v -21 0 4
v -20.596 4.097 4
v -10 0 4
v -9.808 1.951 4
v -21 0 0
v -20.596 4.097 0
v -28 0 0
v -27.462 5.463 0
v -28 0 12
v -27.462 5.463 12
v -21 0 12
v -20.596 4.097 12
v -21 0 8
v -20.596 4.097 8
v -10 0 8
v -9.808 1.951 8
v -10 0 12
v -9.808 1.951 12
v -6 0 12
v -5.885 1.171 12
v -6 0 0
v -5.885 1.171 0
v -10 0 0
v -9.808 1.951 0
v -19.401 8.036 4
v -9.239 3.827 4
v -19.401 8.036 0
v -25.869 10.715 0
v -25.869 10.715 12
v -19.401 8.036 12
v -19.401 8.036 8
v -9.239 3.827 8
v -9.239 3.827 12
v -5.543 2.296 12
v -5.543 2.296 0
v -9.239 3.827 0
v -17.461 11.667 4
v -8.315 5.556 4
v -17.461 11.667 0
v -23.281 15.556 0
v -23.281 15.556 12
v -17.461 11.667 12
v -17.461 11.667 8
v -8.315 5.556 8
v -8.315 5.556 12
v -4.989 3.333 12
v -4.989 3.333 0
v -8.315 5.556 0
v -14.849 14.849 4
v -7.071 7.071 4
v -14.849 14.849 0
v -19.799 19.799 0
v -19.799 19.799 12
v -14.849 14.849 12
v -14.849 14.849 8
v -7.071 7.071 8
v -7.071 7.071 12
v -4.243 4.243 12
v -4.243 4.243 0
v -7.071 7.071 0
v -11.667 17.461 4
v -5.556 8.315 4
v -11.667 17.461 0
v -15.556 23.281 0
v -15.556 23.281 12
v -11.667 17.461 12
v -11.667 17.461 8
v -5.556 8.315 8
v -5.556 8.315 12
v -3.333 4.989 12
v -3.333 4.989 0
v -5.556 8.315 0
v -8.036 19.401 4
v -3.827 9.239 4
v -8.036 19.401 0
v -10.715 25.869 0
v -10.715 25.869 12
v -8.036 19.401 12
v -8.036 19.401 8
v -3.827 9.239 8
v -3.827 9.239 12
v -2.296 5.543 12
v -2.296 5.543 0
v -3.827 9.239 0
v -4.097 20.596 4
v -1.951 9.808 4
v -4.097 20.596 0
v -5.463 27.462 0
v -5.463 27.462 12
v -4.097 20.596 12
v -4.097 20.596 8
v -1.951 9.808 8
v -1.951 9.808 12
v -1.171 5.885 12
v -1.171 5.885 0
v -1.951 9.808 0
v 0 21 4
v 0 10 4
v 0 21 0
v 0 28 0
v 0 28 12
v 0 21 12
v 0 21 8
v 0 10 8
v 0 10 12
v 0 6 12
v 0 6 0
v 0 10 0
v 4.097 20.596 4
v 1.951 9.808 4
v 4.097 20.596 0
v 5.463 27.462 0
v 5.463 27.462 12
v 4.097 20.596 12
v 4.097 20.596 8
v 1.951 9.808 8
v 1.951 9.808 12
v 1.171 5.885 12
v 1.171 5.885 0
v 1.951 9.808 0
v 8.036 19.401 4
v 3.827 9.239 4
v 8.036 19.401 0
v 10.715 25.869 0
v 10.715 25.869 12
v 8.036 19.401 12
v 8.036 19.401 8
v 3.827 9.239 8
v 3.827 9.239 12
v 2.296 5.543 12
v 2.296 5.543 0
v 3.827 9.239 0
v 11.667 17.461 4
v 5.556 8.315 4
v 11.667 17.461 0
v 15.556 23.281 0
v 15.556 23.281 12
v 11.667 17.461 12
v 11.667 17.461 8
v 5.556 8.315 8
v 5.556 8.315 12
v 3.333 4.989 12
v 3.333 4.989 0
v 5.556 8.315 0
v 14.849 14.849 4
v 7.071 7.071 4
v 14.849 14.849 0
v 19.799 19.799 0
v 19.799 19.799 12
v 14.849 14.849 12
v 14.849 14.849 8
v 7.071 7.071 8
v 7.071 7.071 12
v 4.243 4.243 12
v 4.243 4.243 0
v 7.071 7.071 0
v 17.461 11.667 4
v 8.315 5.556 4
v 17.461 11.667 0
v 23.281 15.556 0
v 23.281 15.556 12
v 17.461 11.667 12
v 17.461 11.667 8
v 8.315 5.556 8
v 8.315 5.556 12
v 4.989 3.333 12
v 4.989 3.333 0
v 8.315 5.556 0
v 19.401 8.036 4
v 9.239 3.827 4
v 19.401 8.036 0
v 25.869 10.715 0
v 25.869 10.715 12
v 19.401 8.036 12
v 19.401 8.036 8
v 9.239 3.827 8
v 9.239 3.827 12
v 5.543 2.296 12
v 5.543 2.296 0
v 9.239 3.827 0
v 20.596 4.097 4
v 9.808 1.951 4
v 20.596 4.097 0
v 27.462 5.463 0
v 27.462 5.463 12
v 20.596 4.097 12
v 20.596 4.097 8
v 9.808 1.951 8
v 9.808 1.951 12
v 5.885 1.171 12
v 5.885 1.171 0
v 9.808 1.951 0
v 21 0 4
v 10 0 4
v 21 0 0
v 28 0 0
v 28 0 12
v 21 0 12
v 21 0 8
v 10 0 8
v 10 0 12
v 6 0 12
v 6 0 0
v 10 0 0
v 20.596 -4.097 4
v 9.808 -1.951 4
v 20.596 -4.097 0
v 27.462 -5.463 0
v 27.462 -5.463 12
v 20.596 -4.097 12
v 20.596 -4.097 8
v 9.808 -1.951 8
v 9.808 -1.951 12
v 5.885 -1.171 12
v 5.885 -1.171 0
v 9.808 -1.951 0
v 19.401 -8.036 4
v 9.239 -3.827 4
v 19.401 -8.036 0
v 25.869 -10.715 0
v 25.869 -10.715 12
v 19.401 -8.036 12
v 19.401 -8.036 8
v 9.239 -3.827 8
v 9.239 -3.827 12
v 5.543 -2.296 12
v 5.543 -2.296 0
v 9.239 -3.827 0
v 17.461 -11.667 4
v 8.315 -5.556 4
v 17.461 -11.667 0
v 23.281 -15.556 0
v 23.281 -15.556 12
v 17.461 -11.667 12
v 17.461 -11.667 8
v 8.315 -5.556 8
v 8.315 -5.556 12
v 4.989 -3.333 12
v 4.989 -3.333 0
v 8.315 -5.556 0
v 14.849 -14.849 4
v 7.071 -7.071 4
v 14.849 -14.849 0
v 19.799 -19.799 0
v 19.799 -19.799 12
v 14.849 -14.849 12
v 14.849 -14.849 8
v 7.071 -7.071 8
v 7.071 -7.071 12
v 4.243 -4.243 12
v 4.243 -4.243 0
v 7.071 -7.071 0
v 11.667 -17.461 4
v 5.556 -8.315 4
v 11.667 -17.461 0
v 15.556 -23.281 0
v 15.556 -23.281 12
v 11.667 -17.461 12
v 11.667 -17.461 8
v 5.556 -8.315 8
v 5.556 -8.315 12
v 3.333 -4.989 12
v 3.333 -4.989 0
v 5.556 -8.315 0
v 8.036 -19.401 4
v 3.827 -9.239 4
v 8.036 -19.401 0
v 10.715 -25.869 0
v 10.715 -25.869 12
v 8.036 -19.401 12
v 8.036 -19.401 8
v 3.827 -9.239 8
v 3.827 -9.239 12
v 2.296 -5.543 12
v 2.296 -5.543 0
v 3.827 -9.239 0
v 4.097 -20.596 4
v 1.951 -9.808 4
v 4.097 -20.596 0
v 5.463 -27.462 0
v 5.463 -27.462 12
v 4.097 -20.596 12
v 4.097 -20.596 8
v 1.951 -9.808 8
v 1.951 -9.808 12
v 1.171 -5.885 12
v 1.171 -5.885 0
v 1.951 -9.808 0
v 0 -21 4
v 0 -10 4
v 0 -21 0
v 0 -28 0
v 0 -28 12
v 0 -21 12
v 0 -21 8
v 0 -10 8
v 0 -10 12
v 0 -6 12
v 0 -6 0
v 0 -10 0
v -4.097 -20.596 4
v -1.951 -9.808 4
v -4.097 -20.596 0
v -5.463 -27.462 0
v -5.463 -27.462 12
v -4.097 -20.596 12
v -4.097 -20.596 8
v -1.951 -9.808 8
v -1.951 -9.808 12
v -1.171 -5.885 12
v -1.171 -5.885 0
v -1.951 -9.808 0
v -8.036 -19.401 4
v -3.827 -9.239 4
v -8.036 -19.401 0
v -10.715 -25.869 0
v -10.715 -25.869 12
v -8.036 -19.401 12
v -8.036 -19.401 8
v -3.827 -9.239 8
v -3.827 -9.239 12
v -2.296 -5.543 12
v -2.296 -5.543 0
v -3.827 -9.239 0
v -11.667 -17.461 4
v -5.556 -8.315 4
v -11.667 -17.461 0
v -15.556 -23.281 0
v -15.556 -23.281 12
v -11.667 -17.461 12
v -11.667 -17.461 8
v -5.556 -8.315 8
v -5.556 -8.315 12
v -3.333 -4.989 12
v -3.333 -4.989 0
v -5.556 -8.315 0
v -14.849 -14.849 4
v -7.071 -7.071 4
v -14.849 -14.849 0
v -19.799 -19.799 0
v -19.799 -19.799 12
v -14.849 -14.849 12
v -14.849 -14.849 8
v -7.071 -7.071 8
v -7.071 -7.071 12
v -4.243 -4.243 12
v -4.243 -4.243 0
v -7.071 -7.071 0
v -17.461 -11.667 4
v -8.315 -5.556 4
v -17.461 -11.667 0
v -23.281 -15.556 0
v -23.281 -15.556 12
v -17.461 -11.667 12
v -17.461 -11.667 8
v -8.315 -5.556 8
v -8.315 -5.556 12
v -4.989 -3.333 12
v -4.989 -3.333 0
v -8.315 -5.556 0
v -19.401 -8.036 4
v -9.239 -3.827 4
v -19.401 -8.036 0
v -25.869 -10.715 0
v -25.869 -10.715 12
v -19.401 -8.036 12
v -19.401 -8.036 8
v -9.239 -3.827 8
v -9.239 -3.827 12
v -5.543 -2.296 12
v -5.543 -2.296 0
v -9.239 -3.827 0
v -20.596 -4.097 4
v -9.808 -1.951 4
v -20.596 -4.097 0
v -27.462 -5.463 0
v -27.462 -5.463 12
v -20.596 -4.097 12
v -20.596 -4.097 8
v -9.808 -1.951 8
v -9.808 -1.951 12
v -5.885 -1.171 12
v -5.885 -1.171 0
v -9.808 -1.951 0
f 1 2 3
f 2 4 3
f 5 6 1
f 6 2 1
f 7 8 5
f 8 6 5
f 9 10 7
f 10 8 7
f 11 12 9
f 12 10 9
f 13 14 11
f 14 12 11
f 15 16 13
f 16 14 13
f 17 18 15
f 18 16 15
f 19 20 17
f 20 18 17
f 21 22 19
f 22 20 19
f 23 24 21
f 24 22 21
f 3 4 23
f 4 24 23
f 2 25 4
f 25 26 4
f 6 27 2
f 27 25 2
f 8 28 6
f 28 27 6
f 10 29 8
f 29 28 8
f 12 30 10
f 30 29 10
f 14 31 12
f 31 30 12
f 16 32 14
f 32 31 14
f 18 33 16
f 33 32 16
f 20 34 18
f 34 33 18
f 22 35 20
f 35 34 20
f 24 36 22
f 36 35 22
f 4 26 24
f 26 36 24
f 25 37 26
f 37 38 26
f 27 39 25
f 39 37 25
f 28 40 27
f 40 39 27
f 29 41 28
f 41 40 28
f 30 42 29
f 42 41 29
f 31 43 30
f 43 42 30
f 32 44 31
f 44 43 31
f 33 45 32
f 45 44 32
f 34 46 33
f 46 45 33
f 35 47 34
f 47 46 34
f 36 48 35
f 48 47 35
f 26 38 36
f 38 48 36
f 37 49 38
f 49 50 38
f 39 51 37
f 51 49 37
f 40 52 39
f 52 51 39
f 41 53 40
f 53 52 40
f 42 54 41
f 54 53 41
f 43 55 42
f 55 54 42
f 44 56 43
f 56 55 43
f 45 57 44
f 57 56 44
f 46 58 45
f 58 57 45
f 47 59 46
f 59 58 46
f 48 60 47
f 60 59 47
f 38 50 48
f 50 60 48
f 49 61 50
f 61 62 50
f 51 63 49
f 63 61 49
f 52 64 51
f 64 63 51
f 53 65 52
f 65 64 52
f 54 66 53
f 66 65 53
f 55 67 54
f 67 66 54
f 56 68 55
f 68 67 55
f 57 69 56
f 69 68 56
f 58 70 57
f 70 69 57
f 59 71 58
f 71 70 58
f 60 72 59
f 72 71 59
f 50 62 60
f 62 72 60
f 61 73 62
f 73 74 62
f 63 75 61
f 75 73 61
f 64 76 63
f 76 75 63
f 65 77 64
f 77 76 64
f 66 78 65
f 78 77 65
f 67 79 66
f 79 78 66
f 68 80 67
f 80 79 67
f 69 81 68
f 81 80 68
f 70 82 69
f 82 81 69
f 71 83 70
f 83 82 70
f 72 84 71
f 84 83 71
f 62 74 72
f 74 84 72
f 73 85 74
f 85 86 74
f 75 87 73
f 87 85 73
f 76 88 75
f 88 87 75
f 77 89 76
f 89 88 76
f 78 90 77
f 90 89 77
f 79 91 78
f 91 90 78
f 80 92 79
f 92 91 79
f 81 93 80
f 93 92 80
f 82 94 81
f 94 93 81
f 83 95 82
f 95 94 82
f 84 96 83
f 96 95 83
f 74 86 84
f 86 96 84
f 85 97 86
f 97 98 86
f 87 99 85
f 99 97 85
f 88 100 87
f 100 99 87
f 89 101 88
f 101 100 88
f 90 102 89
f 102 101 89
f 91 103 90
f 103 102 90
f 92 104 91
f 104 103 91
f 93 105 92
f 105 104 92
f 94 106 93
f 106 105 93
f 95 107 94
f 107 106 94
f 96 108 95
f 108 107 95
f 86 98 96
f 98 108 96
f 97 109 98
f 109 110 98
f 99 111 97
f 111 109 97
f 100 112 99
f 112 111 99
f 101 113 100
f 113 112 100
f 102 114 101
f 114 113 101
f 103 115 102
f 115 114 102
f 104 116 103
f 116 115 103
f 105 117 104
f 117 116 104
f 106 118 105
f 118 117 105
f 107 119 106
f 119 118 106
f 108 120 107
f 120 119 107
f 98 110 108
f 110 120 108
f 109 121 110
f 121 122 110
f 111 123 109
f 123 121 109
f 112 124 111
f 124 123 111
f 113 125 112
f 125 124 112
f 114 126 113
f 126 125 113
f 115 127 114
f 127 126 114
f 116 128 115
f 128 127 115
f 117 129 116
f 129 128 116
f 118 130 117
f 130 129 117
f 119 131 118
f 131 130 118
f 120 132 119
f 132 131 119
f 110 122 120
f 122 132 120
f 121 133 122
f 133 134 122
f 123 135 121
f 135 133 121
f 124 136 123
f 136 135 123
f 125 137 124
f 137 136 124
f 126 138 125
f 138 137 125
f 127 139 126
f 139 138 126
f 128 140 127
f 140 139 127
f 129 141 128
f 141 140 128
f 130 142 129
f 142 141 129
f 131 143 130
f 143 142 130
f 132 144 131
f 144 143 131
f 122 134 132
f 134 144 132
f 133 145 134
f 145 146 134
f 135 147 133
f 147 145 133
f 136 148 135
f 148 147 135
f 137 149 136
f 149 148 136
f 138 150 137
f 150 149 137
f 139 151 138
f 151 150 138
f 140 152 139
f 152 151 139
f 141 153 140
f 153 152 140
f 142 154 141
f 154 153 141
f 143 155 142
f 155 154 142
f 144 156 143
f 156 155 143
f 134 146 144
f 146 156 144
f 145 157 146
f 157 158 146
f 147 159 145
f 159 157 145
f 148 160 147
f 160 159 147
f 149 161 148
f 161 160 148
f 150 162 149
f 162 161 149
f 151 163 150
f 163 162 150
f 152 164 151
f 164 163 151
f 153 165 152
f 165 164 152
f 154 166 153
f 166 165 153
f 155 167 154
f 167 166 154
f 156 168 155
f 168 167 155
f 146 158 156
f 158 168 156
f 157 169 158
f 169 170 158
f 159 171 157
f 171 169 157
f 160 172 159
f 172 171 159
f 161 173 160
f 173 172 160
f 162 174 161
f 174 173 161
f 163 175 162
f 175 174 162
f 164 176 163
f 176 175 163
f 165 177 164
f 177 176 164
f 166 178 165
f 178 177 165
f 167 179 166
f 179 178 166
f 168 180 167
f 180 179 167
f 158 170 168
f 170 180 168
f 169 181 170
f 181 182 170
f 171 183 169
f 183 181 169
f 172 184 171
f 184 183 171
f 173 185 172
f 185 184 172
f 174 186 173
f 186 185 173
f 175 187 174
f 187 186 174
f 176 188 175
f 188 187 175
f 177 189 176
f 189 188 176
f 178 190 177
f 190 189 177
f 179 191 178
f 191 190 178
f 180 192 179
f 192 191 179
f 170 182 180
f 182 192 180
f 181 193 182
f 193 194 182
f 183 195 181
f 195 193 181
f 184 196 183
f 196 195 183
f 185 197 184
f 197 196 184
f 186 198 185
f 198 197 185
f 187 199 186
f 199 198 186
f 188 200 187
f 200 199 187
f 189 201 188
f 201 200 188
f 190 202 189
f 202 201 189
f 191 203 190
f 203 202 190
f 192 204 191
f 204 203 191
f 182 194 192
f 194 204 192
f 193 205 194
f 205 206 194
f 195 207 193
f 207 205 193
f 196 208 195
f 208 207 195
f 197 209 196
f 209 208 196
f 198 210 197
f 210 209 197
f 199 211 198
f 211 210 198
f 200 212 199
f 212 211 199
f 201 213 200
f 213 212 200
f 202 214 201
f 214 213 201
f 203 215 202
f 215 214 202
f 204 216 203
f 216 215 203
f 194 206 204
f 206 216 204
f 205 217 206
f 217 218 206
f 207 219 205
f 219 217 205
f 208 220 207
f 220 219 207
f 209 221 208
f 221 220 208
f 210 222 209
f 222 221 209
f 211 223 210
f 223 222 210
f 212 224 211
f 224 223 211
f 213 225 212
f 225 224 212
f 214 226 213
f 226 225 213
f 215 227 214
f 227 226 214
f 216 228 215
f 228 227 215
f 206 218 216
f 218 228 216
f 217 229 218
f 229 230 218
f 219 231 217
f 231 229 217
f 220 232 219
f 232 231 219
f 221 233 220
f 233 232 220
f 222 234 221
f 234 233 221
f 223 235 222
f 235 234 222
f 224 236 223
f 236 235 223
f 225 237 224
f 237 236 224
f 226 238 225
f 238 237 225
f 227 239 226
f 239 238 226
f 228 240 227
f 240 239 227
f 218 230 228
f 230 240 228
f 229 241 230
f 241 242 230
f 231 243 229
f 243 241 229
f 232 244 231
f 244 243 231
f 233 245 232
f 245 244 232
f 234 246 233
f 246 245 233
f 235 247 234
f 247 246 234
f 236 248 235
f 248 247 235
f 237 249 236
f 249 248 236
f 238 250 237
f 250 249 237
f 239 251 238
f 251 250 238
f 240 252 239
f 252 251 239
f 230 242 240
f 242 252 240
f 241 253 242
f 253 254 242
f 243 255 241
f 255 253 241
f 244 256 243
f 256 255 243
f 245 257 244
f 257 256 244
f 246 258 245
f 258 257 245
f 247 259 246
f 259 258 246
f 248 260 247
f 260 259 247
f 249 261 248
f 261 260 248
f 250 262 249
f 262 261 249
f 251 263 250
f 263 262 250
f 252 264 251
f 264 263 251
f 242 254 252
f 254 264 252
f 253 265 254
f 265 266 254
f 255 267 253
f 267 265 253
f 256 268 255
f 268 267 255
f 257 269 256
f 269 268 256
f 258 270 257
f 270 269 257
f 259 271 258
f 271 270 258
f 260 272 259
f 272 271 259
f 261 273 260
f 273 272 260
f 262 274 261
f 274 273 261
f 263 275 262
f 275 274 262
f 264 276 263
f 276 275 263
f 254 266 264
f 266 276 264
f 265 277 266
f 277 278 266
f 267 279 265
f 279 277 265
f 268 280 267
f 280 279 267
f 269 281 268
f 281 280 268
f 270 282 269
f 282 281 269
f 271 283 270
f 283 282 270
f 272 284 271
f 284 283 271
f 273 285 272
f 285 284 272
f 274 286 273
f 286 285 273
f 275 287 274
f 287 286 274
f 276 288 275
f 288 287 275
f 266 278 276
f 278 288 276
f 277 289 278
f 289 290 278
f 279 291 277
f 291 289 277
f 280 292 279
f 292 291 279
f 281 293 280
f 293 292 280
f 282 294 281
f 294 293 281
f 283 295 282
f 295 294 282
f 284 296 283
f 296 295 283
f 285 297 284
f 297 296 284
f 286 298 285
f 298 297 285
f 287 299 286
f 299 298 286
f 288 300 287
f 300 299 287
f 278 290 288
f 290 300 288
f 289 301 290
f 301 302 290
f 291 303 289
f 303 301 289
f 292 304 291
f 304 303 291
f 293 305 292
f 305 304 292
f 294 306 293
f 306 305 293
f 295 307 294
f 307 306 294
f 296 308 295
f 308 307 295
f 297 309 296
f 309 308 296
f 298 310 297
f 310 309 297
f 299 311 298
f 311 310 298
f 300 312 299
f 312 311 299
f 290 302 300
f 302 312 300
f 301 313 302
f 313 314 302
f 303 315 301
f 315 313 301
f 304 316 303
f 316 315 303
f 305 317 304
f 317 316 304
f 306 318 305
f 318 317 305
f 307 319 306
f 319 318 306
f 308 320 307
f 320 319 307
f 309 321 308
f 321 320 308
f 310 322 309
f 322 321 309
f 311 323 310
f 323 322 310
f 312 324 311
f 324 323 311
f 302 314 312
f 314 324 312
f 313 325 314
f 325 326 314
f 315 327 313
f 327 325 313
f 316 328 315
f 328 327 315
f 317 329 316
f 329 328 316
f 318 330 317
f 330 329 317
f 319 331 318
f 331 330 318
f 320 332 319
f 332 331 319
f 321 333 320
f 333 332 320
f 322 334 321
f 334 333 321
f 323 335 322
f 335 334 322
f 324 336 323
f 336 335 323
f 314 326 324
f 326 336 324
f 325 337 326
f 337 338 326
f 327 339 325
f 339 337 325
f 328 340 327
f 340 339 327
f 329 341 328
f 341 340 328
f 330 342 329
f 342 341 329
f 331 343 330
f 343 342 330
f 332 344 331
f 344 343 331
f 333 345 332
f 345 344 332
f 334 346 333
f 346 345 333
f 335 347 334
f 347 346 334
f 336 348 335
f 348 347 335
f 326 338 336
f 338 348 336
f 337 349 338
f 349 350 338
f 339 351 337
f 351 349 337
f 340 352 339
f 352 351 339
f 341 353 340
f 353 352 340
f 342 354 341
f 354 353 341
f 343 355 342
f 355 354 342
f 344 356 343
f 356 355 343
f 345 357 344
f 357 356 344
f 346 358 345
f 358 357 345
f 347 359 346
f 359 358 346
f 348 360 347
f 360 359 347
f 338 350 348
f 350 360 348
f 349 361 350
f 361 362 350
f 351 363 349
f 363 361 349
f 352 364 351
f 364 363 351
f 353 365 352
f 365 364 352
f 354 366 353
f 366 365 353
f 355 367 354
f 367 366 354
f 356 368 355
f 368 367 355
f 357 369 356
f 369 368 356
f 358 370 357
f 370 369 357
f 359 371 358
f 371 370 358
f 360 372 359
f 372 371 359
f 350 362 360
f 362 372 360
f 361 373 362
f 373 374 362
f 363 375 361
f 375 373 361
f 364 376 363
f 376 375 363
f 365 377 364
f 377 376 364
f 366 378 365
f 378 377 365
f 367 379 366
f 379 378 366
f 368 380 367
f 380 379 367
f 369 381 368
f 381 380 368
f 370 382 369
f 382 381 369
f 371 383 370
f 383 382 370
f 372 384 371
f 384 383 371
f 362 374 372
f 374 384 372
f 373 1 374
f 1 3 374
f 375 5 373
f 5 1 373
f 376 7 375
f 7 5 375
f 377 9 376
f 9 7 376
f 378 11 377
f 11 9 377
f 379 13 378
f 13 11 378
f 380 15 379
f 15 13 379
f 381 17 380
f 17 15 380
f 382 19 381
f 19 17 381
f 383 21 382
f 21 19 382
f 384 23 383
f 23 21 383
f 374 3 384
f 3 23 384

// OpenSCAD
$fn = 32;

// ----------------------------------------------------------------------
// Revolved part: handwheel R28
// ----------------------------------------------------------------------

// --- parameters (mm) ---
bore_r = 6;               // bore radius
rim_r = 28;               // rim radius
rim_w = 7;                // rim axial width
rim_t = 12;               // rim diameter height
hub_r = 10;               // hub radius
web_t = 4;                // web thickness
revolve_angle = 360;      // revolve sweep, degrees

bore_d = 2 * bore_r;
rim_d = 2 * rim_r;
hub_d = 2 * hub_r;

profile = [[6, 0], [10, 0], [10, 4], [21, 4], [21, 0], [28, 0], [28, 12], [21, 12], [21, 8], [10, 8], [10, 12], [6, 12]];  // primary outline, 12 points, counter clockwise

// --- the one profile operation ---
rotate_extrude(angle = revolve_angle) polygon(points = profile);
